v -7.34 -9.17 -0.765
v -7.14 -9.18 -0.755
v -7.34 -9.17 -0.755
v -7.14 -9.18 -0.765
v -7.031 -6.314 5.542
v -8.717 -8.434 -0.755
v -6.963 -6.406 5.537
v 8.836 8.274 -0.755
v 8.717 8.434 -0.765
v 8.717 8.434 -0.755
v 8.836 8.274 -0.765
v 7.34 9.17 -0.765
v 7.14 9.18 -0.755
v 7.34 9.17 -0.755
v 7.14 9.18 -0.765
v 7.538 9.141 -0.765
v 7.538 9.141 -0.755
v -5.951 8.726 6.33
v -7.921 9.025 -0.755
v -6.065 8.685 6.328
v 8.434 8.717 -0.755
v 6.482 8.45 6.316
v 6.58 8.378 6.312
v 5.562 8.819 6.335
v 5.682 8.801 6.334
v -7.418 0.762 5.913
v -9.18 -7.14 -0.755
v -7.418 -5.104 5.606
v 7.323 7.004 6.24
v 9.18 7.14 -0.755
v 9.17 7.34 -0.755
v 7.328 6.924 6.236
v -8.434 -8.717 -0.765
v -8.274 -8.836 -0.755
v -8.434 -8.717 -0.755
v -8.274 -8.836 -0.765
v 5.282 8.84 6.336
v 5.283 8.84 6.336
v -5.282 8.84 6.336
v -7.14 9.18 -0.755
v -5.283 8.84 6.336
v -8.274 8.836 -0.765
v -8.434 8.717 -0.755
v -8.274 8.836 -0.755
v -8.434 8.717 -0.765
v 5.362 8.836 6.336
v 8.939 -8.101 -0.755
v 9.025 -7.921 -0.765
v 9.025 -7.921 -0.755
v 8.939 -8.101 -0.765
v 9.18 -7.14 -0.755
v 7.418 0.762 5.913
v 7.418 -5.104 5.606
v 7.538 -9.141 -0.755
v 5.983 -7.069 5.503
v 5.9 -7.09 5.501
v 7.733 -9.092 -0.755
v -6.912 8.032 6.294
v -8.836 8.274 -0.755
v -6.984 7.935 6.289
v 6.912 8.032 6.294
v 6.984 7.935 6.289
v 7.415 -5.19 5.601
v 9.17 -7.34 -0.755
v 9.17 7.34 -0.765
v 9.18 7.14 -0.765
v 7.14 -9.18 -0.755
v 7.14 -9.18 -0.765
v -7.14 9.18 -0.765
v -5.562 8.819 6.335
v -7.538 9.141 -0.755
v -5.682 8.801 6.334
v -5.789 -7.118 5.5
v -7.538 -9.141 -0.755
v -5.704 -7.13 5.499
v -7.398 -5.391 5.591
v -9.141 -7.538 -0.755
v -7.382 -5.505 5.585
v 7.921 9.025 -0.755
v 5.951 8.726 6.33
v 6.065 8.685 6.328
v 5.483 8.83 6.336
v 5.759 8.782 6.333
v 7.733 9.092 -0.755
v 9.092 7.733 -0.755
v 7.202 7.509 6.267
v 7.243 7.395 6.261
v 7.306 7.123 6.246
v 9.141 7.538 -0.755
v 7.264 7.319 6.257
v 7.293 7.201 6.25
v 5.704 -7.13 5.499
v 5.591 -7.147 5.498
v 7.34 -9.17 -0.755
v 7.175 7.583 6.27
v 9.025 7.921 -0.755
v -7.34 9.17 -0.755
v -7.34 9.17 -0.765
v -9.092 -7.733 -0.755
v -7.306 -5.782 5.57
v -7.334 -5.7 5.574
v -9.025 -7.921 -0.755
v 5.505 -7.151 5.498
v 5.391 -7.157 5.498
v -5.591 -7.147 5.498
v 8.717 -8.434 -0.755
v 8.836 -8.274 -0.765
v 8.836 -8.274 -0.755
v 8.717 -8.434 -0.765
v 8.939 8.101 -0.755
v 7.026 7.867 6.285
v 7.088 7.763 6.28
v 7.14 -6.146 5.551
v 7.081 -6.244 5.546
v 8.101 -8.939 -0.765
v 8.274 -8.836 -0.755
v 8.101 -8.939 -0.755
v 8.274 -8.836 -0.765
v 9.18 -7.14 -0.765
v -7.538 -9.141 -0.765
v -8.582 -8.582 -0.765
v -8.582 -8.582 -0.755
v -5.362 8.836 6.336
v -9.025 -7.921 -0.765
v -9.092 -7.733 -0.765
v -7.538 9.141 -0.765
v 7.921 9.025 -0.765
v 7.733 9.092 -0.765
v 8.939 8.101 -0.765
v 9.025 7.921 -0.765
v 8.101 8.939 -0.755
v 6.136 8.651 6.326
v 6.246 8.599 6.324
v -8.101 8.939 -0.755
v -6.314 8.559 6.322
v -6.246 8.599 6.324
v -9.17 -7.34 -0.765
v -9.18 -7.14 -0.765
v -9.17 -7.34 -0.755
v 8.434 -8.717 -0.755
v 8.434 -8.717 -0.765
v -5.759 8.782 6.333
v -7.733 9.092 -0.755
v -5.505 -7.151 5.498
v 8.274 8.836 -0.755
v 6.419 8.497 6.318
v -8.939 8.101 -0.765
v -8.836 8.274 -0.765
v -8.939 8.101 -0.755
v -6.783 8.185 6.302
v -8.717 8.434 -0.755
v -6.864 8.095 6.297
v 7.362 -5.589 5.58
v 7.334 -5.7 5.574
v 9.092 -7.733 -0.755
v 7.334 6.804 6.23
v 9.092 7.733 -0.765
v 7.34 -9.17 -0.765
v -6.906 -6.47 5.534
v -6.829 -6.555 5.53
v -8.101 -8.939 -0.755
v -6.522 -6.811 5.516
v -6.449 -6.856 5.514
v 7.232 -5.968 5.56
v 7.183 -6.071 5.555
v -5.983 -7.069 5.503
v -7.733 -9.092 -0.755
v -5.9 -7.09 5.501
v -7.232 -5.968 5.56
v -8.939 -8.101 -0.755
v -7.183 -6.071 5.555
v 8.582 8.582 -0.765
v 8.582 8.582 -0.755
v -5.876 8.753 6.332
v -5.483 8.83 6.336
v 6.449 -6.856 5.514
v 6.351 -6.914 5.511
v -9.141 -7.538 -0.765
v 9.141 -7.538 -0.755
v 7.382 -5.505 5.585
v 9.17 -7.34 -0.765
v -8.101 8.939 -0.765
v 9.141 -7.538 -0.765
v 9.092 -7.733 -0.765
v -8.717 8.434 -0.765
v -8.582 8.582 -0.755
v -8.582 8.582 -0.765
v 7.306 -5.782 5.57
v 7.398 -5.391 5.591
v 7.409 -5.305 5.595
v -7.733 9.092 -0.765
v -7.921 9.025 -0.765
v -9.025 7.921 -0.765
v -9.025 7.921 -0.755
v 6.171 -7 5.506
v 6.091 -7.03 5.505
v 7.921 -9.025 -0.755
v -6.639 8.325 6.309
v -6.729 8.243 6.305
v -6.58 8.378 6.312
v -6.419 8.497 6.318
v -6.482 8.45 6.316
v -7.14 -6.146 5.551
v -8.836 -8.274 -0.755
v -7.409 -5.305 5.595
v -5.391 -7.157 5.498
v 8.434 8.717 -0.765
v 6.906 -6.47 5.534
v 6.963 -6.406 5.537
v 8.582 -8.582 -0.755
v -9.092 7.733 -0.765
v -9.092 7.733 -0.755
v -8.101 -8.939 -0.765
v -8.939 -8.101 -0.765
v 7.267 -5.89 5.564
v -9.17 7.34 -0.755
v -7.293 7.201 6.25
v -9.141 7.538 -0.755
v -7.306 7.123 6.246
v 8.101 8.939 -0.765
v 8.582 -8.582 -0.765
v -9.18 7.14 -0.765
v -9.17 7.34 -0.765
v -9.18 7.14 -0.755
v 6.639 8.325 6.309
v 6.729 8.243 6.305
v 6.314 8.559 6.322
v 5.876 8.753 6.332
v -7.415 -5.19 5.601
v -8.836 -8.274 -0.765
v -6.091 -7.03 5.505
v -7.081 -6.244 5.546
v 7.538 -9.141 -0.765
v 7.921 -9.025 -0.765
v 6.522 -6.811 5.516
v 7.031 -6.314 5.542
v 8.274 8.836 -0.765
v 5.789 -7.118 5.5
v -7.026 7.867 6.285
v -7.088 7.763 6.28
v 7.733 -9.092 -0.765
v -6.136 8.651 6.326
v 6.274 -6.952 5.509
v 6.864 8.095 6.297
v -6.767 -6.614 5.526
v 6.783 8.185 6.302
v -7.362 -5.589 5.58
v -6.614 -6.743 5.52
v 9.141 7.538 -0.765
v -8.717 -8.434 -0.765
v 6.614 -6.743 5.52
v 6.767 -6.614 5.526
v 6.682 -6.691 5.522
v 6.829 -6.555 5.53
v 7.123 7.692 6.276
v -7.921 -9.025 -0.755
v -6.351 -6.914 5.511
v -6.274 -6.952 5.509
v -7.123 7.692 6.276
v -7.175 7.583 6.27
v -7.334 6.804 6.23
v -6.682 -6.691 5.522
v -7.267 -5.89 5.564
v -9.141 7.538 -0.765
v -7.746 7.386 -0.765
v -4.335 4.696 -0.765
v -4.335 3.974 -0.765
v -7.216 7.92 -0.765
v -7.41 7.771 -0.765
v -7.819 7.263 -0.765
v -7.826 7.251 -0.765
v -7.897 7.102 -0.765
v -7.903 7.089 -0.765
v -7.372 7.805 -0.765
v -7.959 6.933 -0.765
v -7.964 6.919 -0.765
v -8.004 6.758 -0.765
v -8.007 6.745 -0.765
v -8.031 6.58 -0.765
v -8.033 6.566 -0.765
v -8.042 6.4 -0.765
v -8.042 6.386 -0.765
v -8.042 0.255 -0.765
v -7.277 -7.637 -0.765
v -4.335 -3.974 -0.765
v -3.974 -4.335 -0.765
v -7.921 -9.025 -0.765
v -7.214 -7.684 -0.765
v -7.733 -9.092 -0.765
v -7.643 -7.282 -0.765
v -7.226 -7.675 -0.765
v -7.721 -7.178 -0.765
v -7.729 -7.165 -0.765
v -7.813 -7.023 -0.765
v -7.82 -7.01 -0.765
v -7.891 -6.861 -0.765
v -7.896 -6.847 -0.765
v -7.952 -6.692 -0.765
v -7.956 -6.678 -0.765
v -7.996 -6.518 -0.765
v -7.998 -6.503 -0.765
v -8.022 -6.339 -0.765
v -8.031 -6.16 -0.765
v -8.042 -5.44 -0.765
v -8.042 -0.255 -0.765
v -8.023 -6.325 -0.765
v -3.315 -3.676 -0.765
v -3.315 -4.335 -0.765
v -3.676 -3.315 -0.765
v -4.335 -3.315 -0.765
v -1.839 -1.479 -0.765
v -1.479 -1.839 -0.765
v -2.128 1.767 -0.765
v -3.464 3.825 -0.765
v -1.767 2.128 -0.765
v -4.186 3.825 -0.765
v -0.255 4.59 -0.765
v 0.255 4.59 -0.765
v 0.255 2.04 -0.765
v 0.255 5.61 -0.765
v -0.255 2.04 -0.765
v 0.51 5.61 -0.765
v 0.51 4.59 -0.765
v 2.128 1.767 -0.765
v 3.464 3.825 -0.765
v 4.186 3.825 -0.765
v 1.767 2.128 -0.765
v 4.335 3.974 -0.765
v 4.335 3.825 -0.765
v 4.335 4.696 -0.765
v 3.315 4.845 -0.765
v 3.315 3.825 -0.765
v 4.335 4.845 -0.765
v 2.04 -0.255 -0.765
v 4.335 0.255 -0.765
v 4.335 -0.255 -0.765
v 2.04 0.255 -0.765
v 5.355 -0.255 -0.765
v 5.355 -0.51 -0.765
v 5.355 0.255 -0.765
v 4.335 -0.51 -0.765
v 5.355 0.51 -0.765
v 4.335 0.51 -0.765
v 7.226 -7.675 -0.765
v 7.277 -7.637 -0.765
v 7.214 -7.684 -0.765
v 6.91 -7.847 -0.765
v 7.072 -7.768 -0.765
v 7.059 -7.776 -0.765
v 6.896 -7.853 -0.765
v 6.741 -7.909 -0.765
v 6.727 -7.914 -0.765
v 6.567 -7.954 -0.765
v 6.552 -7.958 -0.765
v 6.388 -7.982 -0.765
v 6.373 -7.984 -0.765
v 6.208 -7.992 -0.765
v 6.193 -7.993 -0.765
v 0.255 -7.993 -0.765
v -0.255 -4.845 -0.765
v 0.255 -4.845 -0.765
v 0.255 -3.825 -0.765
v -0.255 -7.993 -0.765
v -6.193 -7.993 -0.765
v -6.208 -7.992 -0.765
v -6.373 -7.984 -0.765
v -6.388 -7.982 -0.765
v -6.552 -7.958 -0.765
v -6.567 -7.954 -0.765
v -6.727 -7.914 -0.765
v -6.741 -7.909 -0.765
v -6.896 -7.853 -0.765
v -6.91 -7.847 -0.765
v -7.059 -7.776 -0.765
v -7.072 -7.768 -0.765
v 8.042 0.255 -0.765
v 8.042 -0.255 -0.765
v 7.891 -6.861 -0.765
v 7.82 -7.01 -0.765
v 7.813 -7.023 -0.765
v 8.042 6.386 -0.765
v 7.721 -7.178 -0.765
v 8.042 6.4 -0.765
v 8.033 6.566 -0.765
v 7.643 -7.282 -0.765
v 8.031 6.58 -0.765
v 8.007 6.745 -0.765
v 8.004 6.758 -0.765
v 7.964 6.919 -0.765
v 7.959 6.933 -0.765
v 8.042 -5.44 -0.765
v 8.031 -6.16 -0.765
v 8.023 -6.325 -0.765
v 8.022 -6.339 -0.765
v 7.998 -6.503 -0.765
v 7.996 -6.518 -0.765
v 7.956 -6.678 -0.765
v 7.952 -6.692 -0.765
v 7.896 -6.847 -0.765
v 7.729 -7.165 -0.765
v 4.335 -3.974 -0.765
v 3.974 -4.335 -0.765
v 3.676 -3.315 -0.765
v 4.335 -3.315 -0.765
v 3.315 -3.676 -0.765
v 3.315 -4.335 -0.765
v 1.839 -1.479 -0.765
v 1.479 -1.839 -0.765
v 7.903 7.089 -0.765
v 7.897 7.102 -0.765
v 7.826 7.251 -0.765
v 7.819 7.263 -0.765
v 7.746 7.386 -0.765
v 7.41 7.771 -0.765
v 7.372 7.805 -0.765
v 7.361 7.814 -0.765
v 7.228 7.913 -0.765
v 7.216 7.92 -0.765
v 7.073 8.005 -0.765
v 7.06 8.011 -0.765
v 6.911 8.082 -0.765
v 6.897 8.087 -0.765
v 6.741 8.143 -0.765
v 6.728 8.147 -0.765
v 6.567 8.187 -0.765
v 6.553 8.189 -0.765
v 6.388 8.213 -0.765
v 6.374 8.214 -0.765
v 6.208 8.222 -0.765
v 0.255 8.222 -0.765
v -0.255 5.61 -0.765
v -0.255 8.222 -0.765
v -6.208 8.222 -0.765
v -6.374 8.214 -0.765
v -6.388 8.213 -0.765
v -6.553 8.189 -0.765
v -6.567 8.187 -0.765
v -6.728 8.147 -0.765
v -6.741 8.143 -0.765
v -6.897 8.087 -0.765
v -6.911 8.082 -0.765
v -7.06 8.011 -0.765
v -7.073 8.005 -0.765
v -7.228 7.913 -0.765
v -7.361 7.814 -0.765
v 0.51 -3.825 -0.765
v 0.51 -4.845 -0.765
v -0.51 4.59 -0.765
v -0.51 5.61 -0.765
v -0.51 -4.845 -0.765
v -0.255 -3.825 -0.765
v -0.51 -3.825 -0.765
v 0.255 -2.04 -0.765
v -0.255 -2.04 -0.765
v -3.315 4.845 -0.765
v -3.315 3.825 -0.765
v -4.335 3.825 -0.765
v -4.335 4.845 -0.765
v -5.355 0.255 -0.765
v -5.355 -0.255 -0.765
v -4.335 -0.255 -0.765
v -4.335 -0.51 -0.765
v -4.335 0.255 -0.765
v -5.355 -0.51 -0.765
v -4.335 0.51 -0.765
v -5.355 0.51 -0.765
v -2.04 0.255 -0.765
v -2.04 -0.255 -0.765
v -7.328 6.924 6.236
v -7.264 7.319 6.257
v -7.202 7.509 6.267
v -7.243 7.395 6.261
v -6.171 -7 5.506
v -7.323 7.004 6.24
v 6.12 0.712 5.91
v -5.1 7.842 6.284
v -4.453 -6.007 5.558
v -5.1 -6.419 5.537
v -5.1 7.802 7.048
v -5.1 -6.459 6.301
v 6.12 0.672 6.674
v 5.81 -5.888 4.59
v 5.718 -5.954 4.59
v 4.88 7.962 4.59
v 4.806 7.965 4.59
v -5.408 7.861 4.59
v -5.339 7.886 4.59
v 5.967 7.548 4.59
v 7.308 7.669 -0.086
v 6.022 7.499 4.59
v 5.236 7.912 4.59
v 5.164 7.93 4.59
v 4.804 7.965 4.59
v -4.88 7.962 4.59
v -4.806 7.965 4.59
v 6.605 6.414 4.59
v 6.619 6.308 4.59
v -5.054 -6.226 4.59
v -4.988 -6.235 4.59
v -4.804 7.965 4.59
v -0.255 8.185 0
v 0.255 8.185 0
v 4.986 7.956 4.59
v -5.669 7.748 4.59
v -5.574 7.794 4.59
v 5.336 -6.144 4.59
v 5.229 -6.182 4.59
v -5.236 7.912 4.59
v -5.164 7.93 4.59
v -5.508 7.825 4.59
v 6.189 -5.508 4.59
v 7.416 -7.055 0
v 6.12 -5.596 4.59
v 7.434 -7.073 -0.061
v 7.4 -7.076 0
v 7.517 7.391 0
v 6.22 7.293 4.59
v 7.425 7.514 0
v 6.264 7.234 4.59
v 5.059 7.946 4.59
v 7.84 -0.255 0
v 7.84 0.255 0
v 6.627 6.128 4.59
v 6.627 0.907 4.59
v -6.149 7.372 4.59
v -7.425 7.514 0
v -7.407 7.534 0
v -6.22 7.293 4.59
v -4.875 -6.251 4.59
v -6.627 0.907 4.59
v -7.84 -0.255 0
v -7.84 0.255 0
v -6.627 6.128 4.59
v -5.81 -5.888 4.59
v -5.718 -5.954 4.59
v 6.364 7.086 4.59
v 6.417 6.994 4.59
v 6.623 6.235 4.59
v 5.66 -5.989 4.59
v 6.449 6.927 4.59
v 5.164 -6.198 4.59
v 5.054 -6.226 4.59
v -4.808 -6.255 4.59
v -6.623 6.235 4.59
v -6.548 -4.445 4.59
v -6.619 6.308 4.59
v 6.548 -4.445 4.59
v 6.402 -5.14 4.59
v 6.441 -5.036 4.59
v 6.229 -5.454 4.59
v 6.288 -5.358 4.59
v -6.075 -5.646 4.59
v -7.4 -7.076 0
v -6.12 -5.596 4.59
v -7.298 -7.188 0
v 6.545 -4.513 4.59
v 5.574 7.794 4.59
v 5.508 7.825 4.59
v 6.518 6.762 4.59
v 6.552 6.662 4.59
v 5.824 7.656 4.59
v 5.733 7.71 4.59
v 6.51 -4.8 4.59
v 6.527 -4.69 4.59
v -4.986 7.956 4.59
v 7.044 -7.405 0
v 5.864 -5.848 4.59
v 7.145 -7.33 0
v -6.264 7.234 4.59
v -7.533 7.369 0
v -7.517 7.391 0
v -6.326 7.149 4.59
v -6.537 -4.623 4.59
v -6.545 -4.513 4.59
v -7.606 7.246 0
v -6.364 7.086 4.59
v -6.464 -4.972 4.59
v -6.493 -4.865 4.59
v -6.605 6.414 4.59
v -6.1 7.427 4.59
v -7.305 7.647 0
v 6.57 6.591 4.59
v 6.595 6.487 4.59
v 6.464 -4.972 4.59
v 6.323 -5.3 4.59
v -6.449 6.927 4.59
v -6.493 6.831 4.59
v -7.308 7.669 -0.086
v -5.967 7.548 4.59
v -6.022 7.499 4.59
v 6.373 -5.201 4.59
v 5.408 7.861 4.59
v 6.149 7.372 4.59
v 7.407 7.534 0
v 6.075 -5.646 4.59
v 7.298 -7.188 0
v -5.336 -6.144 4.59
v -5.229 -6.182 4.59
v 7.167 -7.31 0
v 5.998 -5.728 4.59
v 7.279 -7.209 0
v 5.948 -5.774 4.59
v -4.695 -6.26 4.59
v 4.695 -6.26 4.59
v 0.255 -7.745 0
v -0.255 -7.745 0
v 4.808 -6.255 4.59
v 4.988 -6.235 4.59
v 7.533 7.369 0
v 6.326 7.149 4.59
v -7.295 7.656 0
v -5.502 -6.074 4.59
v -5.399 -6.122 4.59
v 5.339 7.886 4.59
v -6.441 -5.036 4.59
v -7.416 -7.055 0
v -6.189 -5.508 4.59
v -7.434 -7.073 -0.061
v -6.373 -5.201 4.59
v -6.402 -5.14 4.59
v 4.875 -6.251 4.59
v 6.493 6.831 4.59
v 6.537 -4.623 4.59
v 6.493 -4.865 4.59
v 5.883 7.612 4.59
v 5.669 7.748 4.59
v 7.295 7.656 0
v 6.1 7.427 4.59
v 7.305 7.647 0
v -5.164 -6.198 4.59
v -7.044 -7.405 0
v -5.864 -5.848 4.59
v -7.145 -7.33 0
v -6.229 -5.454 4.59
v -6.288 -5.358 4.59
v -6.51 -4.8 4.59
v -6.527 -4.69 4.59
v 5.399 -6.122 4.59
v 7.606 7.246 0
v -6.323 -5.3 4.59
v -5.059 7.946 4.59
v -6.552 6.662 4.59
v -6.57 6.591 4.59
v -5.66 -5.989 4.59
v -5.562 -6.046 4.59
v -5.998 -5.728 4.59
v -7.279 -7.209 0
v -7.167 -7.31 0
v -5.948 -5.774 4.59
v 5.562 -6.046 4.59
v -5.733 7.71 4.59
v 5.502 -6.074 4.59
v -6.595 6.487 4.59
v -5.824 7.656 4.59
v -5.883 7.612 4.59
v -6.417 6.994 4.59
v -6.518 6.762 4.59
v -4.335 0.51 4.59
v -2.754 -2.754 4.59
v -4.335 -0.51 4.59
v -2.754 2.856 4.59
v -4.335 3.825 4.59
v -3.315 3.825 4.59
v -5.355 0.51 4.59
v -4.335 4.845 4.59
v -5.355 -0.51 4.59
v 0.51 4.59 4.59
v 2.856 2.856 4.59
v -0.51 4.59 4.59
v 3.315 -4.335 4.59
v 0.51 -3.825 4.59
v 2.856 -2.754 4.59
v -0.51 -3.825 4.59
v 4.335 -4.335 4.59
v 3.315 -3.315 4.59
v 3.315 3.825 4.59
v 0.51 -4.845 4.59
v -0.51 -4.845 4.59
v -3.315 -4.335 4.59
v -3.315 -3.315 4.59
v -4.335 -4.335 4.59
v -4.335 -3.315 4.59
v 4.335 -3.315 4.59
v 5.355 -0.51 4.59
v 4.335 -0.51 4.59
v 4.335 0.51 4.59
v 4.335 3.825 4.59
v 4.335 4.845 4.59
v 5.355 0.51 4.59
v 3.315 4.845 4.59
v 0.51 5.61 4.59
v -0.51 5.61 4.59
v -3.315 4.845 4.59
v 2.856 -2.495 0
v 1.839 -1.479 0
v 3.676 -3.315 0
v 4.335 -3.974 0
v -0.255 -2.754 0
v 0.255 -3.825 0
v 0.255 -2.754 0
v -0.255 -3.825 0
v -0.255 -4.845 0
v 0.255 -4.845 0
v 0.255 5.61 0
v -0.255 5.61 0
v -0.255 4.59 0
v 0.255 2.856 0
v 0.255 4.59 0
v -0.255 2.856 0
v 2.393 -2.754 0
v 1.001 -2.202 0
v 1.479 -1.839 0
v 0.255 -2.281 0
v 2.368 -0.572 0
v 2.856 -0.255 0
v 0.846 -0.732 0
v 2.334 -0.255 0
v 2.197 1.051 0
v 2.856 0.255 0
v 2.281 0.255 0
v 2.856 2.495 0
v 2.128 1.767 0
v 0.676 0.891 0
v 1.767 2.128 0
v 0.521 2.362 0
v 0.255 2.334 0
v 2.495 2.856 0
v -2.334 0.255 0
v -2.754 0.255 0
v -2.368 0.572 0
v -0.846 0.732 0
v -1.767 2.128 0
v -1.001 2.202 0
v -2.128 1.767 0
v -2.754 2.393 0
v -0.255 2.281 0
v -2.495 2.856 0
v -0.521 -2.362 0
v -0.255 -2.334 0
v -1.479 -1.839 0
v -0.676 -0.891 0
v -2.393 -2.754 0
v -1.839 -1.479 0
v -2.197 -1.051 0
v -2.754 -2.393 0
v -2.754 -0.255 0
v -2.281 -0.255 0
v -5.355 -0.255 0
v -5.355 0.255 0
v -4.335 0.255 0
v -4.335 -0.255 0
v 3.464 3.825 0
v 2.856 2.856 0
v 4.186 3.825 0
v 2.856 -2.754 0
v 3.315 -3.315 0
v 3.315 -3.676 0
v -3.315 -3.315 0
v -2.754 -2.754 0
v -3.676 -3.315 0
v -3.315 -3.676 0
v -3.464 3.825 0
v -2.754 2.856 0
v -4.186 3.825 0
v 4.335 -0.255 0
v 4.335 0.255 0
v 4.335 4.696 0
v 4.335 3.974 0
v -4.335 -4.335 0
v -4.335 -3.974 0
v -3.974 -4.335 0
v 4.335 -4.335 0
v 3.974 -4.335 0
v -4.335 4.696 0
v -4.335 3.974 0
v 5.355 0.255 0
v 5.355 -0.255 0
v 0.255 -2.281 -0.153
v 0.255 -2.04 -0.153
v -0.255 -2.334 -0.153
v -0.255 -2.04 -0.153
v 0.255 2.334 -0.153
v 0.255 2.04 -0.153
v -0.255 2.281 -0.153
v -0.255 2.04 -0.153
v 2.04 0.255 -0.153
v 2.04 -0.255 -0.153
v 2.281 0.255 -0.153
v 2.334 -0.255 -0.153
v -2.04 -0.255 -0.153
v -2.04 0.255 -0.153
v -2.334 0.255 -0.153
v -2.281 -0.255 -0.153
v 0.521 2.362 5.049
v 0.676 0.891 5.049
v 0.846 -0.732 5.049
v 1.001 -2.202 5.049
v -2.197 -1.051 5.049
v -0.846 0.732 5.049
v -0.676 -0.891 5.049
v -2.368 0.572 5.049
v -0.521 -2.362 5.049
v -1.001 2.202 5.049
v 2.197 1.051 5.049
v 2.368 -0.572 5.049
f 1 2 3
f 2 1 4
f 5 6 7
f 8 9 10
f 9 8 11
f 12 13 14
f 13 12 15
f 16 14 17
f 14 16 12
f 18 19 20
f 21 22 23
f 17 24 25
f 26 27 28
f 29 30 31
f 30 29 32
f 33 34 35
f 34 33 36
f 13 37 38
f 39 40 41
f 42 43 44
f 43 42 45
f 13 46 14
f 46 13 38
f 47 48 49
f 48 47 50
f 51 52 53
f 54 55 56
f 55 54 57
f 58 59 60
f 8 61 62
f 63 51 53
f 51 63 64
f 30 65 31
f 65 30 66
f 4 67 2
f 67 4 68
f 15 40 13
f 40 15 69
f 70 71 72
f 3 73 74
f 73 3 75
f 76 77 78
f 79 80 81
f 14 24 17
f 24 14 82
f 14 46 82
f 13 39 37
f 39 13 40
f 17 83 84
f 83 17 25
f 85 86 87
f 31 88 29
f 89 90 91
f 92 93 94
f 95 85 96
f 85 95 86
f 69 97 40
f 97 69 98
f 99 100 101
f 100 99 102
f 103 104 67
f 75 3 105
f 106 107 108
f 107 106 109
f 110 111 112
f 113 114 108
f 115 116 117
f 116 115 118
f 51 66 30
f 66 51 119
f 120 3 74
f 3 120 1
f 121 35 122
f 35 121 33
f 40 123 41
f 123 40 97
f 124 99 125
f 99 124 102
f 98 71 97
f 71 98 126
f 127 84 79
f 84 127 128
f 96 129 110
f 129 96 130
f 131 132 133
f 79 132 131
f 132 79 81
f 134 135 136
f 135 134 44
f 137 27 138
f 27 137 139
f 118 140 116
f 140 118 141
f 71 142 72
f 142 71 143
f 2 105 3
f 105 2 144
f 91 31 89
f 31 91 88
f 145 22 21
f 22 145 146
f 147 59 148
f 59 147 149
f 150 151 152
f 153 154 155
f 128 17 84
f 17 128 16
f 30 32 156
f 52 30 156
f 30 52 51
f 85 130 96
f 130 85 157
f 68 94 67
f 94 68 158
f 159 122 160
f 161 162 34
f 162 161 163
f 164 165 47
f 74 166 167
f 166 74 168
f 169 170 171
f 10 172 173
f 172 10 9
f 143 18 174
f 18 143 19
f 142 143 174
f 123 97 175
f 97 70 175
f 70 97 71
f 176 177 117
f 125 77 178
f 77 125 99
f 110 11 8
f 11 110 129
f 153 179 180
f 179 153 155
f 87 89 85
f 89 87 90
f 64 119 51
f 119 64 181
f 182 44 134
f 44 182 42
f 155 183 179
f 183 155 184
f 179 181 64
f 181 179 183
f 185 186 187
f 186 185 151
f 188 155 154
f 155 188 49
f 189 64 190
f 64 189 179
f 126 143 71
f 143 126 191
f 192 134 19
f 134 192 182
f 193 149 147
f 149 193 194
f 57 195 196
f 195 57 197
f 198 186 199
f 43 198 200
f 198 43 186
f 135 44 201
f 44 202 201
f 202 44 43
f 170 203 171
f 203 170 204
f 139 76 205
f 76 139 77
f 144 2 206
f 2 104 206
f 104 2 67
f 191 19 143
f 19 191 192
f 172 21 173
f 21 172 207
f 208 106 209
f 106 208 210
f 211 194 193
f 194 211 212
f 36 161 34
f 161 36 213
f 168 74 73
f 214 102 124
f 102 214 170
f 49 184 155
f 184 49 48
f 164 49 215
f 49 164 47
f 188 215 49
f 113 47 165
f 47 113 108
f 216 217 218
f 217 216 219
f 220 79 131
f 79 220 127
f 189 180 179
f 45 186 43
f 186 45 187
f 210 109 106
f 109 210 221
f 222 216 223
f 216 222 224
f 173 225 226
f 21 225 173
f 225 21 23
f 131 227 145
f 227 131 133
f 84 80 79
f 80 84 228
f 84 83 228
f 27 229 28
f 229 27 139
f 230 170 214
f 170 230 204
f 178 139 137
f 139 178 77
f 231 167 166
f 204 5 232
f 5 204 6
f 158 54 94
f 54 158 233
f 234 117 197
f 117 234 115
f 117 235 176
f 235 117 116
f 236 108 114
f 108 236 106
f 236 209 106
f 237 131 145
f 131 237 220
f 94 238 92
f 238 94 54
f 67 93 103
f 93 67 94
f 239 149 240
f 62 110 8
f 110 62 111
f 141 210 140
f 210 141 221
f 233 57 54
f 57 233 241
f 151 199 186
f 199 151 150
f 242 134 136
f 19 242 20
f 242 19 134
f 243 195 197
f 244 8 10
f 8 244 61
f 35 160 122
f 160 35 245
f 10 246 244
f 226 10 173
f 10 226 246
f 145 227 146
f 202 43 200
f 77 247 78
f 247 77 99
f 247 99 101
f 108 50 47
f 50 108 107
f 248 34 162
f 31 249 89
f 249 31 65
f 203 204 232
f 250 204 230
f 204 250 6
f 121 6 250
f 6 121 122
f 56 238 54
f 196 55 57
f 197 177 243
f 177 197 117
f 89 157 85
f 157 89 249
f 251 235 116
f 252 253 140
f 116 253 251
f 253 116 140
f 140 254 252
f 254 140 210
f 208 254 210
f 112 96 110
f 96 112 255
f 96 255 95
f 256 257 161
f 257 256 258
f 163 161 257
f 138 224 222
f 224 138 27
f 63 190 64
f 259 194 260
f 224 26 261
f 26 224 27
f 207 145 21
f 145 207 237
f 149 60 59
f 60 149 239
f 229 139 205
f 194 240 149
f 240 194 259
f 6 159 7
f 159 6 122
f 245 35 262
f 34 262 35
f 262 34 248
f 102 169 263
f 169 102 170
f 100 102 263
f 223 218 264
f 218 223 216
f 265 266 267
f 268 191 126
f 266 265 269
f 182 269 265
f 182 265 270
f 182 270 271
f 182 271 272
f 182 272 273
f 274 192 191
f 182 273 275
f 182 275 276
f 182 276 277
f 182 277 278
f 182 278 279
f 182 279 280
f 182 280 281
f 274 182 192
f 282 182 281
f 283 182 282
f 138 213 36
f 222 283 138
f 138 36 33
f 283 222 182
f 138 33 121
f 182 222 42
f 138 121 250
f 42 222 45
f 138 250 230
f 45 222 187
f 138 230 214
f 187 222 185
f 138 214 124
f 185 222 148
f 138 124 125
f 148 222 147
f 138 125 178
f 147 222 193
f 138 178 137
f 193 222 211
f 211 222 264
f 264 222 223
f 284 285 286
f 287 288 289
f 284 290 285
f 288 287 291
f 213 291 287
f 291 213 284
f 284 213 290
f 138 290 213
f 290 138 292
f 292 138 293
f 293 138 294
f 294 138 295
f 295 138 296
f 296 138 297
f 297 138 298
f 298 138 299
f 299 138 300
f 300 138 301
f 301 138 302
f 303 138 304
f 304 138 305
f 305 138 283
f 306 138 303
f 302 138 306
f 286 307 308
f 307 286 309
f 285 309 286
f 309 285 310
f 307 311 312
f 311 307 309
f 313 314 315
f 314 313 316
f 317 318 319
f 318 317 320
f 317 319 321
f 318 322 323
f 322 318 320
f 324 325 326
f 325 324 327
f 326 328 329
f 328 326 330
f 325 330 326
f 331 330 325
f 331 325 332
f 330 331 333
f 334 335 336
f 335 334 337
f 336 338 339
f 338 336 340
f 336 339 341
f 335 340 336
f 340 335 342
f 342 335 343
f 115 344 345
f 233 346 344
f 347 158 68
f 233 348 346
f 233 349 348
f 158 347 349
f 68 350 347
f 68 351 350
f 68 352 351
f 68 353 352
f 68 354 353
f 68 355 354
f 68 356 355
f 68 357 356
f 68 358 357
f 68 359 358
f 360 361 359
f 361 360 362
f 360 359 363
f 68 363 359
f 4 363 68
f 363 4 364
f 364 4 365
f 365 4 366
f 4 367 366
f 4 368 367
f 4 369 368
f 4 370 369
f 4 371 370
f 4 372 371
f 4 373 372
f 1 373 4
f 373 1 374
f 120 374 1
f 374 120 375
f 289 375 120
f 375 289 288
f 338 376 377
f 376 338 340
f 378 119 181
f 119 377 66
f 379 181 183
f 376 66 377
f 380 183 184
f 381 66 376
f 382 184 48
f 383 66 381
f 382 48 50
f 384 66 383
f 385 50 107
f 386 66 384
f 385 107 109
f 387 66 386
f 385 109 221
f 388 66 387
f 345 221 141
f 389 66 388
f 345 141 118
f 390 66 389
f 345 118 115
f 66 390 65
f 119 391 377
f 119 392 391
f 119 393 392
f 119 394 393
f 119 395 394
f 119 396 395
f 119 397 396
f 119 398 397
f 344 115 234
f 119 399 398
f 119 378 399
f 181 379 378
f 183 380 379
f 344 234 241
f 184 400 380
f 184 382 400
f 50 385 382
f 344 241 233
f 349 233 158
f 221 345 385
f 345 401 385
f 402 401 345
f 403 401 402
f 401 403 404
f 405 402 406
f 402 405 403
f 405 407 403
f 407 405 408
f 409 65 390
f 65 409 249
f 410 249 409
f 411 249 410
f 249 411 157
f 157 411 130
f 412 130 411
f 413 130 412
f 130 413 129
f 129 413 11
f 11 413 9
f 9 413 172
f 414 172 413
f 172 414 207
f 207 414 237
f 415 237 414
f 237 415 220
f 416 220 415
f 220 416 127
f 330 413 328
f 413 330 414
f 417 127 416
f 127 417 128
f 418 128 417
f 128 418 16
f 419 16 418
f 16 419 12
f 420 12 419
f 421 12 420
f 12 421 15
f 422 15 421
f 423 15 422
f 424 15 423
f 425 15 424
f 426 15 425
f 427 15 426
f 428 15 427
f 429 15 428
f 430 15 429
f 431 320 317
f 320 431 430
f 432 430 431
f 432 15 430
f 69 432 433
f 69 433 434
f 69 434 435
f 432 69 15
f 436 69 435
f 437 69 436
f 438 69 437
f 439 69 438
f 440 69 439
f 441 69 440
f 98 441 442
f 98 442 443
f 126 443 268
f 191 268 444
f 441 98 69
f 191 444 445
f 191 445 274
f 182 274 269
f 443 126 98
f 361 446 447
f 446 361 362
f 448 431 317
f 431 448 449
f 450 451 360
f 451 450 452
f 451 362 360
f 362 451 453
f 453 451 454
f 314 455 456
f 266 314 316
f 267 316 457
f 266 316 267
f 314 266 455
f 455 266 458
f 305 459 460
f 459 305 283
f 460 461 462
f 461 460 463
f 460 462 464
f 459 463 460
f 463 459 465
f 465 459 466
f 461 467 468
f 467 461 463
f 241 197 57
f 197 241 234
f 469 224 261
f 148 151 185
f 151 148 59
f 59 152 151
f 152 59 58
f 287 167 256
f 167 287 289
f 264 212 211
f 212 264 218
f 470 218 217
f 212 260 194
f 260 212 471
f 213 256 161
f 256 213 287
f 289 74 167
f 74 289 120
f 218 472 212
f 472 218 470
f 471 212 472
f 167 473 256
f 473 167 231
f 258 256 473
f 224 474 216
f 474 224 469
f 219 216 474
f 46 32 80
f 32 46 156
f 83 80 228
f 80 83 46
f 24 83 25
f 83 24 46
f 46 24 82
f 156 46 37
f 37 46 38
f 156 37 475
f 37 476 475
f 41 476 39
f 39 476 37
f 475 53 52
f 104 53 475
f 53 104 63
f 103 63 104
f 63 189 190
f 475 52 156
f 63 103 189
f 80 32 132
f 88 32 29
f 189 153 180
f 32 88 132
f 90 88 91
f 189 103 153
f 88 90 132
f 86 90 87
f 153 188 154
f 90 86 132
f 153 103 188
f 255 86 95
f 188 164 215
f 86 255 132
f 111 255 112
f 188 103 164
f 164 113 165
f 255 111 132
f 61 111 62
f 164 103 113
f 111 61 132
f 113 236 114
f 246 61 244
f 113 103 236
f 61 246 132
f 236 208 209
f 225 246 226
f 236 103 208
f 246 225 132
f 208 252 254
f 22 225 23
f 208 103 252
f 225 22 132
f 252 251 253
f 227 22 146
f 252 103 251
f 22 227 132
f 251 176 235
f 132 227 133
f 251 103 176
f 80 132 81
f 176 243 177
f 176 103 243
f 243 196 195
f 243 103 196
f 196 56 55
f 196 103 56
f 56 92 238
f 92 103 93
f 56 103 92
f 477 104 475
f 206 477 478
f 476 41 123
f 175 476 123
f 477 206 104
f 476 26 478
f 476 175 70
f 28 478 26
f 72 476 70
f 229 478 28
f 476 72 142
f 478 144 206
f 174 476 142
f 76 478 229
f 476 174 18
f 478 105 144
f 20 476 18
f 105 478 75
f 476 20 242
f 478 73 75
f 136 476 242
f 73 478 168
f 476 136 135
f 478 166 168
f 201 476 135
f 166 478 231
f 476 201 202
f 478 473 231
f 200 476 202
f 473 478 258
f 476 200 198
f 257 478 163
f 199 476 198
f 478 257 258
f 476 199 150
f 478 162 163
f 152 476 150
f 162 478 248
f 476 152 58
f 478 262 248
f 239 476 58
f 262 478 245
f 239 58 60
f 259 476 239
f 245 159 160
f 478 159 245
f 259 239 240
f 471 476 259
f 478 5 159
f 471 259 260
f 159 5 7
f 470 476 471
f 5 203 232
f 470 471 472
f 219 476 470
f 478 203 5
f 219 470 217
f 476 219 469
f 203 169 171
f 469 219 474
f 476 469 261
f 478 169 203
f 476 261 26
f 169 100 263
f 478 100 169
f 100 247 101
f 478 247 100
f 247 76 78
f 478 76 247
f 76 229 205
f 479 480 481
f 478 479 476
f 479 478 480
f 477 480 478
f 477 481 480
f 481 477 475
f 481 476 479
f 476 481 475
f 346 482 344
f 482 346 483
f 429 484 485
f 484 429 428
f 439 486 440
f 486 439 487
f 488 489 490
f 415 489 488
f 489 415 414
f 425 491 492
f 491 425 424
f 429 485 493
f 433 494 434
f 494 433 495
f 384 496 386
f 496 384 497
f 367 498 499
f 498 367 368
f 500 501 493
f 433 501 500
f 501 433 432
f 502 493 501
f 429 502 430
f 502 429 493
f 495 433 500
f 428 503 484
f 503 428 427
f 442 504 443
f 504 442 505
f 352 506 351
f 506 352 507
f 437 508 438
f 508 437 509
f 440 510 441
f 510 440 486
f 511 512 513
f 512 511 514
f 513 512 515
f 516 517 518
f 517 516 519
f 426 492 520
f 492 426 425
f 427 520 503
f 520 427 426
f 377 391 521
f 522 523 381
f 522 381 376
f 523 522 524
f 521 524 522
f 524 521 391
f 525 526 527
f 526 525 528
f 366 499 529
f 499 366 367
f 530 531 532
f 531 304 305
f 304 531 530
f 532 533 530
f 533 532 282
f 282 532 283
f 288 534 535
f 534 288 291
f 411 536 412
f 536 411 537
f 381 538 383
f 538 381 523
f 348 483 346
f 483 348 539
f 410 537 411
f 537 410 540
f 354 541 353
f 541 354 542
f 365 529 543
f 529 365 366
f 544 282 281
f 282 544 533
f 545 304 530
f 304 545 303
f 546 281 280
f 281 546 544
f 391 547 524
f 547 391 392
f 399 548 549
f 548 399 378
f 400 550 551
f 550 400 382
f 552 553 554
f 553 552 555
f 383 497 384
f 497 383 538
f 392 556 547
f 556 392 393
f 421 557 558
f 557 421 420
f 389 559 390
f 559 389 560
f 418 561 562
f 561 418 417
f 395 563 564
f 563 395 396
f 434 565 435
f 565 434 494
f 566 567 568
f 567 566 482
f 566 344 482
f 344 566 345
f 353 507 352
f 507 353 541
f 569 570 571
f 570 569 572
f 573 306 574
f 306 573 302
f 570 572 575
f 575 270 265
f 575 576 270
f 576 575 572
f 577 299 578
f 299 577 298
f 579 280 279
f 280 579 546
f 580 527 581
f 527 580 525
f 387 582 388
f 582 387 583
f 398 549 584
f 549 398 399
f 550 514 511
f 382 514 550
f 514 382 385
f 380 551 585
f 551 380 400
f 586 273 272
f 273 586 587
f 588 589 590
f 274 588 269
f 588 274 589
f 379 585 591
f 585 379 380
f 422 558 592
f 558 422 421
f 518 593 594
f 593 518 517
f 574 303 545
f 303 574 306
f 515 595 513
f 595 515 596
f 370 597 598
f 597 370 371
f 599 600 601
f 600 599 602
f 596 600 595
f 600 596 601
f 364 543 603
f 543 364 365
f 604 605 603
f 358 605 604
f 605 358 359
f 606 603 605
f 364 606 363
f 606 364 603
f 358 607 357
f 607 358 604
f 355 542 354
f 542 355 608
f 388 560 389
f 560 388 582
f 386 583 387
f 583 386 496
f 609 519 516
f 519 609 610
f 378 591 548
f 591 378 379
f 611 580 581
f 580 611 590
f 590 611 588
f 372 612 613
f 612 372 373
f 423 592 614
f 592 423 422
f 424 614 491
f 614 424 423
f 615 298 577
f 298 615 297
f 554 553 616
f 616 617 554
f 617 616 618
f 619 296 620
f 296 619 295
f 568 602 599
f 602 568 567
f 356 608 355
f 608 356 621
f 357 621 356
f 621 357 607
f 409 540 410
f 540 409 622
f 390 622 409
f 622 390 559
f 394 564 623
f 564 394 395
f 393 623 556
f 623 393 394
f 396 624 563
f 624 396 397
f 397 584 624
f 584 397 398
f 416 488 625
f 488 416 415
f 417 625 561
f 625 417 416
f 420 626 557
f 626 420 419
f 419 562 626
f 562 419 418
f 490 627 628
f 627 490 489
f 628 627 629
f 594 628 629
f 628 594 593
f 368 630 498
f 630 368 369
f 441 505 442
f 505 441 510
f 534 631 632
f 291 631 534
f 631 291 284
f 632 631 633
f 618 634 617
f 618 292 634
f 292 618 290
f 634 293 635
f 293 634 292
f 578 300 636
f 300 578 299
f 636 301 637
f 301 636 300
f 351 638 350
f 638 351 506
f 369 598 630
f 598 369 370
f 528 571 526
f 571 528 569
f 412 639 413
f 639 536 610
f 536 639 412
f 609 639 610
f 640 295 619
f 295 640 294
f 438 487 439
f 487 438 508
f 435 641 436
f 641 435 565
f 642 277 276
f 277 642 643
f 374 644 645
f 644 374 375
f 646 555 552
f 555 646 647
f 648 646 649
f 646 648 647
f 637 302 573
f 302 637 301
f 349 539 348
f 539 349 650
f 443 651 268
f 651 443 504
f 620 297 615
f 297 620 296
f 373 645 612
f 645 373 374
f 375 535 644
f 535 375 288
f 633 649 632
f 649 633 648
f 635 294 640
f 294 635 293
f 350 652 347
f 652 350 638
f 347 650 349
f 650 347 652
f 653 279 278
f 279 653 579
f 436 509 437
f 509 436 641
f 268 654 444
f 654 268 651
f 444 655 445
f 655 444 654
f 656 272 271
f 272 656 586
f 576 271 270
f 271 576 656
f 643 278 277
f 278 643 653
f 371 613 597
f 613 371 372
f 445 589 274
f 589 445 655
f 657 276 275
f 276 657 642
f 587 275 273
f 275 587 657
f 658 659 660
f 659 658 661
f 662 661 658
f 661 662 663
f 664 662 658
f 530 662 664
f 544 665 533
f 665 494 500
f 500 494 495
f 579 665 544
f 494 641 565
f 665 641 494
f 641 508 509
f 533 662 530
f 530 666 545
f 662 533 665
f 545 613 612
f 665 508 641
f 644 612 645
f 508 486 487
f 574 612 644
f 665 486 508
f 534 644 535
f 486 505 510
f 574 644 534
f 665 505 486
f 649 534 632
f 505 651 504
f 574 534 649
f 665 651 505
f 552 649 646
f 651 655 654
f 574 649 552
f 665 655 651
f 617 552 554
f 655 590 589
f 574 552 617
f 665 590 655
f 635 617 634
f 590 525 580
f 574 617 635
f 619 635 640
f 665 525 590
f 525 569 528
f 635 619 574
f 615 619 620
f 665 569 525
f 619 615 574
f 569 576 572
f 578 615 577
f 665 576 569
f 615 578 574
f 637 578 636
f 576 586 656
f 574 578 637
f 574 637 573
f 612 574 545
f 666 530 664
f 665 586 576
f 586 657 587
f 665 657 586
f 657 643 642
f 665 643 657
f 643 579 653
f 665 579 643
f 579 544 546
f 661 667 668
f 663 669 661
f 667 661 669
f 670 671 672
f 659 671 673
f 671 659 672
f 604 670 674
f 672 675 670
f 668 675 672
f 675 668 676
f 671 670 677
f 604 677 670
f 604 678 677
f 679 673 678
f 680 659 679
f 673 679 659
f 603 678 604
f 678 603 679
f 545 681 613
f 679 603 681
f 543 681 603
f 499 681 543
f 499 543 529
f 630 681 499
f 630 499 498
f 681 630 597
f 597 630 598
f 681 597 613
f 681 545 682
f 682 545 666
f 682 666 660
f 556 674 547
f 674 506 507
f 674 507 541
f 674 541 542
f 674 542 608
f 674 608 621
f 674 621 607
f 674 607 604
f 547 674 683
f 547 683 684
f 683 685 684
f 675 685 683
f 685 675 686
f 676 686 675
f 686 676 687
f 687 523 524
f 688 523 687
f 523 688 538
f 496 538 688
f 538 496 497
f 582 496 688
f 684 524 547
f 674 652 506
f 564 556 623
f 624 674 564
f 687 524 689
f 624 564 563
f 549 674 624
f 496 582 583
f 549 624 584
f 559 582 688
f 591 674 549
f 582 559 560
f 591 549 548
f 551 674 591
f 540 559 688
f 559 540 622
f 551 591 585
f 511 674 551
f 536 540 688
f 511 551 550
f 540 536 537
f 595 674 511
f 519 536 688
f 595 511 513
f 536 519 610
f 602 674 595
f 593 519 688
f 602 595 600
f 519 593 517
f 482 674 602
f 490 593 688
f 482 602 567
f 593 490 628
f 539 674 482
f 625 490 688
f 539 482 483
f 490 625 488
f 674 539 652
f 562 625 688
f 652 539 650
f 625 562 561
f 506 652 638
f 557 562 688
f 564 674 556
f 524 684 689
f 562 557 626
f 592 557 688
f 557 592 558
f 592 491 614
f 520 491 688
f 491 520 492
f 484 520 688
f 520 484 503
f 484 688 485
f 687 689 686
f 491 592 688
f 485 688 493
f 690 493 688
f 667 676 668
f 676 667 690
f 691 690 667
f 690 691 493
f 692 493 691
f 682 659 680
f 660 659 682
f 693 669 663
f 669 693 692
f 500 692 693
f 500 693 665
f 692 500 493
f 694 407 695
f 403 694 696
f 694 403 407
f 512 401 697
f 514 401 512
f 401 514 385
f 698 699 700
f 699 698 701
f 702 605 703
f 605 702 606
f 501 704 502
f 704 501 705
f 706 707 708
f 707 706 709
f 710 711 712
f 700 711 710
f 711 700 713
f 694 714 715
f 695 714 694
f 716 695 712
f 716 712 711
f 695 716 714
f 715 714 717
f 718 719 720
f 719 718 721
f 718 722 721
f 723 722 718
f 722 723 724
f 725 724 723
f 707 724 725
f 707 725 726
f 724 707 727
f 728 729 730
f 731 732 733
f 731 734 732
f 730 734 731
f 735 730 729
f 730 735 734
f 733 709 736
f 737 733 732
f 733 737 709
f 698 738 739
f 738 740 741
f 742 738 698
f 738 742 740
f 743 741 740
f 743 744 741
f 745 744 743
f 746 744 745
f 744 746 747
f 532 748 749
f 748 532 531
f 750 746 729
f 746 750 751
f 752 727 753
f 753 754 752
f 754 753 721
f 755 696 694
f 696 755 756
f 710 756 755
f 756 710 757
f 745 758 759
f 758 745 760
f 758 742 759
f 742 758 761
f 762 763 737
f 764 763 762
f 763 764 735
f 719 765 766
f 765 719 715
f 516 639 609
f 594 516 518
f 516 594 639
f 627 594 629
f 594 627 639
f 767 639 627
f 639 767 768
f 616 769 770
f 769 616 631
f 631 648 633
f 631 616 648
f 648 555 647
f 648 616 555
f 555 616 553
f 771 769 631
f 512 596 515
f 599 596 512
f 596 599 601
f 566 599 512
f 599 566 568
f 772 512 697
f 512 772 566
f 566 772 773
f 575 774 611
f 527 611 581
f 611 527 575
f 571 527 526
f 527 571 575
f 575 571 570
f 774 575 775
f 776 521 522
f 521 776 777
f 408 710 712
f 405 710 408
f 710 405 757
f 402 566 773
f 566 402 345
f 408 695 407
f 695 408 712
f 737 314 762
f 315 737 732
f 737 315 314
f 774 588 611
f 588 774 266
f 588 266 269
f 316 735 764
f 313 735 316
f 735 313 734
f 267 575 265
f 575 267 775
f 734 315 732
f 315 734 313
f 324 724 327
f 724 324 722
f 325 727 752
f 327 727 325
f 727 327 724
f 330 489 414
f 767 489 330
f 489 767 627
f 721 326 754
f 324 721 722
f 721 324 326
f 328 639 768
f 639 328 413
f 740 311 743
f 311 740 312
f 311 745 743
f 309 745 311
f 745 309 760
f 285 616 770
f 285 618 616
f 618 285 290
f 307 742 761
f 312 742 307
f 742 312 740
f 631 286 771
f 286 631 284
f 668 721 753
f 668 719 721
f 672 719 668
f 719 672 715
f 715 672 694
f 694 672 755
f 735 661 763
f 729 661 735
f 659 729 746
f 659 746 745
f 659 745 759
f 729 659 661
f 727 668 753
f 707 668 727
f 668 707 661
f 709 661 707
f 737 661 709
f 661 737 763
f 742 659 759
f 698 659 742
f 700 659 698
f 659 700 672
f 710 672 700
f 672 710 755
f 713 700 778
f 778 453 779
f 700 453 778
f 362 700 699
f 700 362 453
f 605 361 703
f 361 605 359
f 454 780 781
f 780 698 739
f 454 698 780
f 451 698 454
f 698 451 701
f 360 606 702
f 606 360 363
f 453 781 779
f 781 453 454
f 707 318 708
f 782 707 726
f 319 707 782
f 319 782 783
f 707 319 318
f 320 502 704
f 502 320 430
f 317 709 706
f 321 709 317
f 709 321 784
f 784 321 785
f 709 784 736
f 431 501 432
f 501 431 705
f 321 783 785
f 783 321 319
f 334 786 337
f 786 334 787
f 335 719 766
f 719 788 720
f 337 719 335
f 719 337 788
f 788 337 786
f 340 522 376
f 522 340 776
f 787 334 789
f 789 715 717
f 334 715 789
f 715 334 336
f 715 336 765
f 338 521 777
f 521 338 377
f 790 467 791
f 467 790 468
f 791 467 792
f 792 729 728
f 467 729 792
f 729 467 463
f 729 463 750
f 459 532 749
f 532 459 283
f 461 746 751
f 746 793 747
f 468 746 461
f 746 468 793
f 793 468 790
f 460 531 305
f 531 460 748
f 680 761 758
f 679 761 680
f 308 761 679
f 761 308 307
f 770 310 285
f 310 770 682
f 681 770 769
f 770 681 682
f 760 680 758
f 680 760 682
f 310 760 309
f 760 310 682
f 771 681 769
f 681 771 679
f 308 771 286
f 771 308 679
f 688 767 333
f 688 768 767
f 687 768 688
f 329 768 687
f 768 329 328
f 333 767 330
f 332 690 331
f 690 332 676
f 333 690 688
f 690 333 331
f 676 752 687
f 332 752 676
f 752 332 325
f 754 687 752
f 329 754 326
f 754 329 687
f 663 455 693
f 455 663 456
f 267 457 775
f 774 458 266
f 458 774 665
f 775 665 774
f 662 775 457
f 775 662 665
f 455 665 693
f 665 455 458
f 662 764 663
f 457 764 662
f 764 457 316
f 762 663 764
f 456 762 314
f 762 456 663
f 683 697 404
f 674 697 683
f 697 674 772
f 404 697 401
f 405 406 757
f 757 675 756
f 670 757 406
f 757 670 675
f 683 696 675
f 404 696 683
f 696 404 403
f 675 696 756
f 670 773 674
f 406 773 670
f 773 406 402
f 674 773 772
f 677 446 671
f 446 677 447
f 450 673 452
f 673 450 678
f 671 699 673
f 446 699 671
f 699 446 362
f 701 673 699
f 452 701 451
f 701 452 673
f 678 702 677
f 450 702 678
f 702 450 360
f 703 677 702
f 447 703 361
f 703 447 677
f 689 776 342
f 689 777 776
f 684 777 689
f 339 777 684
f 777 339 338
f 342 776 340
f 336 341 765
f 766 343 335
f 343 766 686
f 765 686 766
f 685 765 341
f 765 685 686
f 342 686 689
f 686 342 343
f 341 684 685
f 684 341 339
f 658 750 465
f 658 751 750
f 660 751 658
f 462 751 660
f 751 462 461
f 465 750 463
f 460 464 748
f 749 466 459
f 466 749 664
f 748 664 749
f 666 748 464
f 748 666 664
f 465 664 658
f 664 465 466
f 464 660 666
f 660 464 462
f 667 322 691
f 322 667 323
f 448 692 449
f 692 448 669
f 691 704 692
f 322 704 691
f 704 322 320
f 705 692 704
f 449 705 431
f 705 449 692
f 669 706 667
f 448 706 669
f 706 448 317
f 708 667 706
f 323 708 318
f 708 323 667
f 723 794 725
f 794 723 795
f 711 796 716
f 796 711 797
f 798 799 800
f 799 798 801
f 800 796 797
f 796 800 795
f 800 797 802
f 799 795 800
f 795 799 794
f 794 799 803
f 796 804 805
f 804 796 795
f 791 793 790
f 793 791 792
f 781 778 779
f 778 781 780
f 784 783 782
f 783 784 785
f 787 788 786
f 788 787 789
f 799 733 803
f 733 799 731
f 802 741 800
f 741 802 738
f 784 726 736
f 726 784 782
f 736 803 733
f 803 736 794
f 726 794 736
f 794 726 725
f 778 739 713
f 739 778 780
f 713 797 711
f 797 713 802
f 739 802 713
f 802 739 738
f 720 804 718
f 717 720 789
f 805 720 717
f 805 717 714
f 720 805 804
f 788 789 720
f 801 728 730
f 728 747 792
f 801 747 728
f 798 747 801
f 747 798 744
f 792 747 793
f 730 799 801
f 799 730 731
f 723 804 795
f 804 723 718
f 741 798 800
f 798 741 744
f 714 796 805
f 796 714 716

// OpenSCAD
// Row 4 decorated Cherry MX key

// dimensions Cherry MX connector
c_corr = .5;                // tolerance
c_horiz = 1.1;              // horizontal bar width
c_vert = 1.0;               // vertical bar width
c_dia = 4;                  // cross width
c_depth = 5;                // connector depth
c_space = 4;                // height of hollow inside
c_inset = 0.75;              // distance connector start to keycap base

// decoration
obj = "emerald.stl";          // decoration object
obj_pos = [0,0.7,2.5];        // decoration offset
factor_em = 1.1;
obj_scale = [0.8*factor_em,1.1*factor_em,1.1*factor_em]; // decoration scale
obj_rot = [3,0,0];          // decoration rotation

// keycap shape
head_tilt = 3;              // rotation of top around x-axis
head_pos = 2.25;            // keycap top y-offset
head_height = 11;           // z-offset of keycap top from the bottom of the keycap
cutoff = 6.5;               // cut keycap here to make room for decoration
                            // must be bigger than c_space + c_corr
key_scale = [1.02,1.02,1.02]; // overall scale

// stuff
$fn = 64;

//triangle
b = 10;
h = 10;
w = 13;

// create basic key shape from dxf frames for base and top
module shape()
{
    hull()
    {
        translate([0,0,-c_inset]) linear_extrude(height=.01) import("base.dxf");
        rotate([head_tilt,0,0]) translate([0,6.75+head_pos,head_height-c_inset]) linear_extrude(height=.01) import("top.dxf");
    }
}

// construct the connector pin
module connector() 
{
    
		rotate([0,0,6]) translate([0,0,c_depth/2-.1]) union()
    {
        cube([c_vert+c_corr,c_dia+c_corr,c_depth+.1], center=true );
        cube([c_dia+c_corr,c_horiz+c_corr,c_depth+.1], center=true );
    }
}

// create the hollow key with decoration
module key()
{
    difference()
    {
        // combine basic key shape with decoration
        union()
        {
            //translate(obj_pos) rotate(obj_rot) scale(obj_scale) import(obj);               
				rotate([head_tilt,0,0]) translate([0,0,0]) linear_extrude(height = w, center = true, convexity = 10, twist = 0)
				
				polygon(points=[[-5,-6],[6,1],[-5,8]], paths=[[0,1,2]]);
// end design
            difference()
            {
                shape();
                rotate([head_tilt,0,0]) translate([0,0,5+cutoff-c_inset]) cube([100,100,10], center=true);
            }
        }

        // subtract scaled basic shape, cut at minimum required height
        difference()
        {
            scale([.9,.9,.9]) translate([0,0,-1]) shape();
            translate([0,0,5+c_space+c_corr]) cube([100,100,10], center=true);
        }
    }
}

// combine key, pin and connector. cleanup below the key
scale(key_scale) difference()
{
    union() 
    { 
        key();

			translate([-2.7,-2.7,0]) cube(size = [(c_dia+1+c_corr),(c_dia+1+c_corr),c_space+c_corr], center = false);
			//RTS support structure
			//connector
			rotate([0,0,45])
			{
				translate([-0.25,-11.3,-0.75]) cube([0.5,9,0.75], center=false);
				translate([-0.25,2.7,-0.75])  cube([0.5,8.5,0.75], center=false);
				translate([2.7,-0.25,-0.75])  cube([8.5,0.5,0.75], center=false);
				translate([-11.3,-0.25,-0.75]) cube([9,0.5,0.75], center=false);
			}
			translate([-0.25,-8.5,-0.75]) cube([0.5,6.5,0.75], center=false);
			translate([-0.25,2,-0.75])  cube([0.5,6.5,0.75], center=false);
			translate([2,-0.25,-0.75])  cube([6.5,0.5,0.75], center=false);
			translate([-8.5,-0.25,-0.75]) cube([6.5,0.5,0.75], center=false);		
			//roof
			translate([-4.25,-4.25,-0.75]) cube([1,1,6], center=false);		
			translate([3.25,3.75,-0.75])   cube([1,1,6], center=false);		
			translate([-4.25,3.75,-0.75])  cube([1,1,6], center=false);		
			translate([3.25,-4.25,-0.75])  cube([1,1,6], center=false);		
			
			translate([-0.5,-4.75,-0.75]) cube([1,1,6], center=false);		
			translate([4.25,-0.5,-0.75])   cube([1,1,6], center=false);		
			translate([-5.25,-0.5,-0.75])  cube([1,1,6], center=false);		
			translate([-0.5,4.5,-0.75])  cube([1,1,6], center=false);		
			
			//END RTS support structure 
	}
    
	connector();	

	translate([0,0,-50-c_inset]) cube([100,100,100], center=true);

}
